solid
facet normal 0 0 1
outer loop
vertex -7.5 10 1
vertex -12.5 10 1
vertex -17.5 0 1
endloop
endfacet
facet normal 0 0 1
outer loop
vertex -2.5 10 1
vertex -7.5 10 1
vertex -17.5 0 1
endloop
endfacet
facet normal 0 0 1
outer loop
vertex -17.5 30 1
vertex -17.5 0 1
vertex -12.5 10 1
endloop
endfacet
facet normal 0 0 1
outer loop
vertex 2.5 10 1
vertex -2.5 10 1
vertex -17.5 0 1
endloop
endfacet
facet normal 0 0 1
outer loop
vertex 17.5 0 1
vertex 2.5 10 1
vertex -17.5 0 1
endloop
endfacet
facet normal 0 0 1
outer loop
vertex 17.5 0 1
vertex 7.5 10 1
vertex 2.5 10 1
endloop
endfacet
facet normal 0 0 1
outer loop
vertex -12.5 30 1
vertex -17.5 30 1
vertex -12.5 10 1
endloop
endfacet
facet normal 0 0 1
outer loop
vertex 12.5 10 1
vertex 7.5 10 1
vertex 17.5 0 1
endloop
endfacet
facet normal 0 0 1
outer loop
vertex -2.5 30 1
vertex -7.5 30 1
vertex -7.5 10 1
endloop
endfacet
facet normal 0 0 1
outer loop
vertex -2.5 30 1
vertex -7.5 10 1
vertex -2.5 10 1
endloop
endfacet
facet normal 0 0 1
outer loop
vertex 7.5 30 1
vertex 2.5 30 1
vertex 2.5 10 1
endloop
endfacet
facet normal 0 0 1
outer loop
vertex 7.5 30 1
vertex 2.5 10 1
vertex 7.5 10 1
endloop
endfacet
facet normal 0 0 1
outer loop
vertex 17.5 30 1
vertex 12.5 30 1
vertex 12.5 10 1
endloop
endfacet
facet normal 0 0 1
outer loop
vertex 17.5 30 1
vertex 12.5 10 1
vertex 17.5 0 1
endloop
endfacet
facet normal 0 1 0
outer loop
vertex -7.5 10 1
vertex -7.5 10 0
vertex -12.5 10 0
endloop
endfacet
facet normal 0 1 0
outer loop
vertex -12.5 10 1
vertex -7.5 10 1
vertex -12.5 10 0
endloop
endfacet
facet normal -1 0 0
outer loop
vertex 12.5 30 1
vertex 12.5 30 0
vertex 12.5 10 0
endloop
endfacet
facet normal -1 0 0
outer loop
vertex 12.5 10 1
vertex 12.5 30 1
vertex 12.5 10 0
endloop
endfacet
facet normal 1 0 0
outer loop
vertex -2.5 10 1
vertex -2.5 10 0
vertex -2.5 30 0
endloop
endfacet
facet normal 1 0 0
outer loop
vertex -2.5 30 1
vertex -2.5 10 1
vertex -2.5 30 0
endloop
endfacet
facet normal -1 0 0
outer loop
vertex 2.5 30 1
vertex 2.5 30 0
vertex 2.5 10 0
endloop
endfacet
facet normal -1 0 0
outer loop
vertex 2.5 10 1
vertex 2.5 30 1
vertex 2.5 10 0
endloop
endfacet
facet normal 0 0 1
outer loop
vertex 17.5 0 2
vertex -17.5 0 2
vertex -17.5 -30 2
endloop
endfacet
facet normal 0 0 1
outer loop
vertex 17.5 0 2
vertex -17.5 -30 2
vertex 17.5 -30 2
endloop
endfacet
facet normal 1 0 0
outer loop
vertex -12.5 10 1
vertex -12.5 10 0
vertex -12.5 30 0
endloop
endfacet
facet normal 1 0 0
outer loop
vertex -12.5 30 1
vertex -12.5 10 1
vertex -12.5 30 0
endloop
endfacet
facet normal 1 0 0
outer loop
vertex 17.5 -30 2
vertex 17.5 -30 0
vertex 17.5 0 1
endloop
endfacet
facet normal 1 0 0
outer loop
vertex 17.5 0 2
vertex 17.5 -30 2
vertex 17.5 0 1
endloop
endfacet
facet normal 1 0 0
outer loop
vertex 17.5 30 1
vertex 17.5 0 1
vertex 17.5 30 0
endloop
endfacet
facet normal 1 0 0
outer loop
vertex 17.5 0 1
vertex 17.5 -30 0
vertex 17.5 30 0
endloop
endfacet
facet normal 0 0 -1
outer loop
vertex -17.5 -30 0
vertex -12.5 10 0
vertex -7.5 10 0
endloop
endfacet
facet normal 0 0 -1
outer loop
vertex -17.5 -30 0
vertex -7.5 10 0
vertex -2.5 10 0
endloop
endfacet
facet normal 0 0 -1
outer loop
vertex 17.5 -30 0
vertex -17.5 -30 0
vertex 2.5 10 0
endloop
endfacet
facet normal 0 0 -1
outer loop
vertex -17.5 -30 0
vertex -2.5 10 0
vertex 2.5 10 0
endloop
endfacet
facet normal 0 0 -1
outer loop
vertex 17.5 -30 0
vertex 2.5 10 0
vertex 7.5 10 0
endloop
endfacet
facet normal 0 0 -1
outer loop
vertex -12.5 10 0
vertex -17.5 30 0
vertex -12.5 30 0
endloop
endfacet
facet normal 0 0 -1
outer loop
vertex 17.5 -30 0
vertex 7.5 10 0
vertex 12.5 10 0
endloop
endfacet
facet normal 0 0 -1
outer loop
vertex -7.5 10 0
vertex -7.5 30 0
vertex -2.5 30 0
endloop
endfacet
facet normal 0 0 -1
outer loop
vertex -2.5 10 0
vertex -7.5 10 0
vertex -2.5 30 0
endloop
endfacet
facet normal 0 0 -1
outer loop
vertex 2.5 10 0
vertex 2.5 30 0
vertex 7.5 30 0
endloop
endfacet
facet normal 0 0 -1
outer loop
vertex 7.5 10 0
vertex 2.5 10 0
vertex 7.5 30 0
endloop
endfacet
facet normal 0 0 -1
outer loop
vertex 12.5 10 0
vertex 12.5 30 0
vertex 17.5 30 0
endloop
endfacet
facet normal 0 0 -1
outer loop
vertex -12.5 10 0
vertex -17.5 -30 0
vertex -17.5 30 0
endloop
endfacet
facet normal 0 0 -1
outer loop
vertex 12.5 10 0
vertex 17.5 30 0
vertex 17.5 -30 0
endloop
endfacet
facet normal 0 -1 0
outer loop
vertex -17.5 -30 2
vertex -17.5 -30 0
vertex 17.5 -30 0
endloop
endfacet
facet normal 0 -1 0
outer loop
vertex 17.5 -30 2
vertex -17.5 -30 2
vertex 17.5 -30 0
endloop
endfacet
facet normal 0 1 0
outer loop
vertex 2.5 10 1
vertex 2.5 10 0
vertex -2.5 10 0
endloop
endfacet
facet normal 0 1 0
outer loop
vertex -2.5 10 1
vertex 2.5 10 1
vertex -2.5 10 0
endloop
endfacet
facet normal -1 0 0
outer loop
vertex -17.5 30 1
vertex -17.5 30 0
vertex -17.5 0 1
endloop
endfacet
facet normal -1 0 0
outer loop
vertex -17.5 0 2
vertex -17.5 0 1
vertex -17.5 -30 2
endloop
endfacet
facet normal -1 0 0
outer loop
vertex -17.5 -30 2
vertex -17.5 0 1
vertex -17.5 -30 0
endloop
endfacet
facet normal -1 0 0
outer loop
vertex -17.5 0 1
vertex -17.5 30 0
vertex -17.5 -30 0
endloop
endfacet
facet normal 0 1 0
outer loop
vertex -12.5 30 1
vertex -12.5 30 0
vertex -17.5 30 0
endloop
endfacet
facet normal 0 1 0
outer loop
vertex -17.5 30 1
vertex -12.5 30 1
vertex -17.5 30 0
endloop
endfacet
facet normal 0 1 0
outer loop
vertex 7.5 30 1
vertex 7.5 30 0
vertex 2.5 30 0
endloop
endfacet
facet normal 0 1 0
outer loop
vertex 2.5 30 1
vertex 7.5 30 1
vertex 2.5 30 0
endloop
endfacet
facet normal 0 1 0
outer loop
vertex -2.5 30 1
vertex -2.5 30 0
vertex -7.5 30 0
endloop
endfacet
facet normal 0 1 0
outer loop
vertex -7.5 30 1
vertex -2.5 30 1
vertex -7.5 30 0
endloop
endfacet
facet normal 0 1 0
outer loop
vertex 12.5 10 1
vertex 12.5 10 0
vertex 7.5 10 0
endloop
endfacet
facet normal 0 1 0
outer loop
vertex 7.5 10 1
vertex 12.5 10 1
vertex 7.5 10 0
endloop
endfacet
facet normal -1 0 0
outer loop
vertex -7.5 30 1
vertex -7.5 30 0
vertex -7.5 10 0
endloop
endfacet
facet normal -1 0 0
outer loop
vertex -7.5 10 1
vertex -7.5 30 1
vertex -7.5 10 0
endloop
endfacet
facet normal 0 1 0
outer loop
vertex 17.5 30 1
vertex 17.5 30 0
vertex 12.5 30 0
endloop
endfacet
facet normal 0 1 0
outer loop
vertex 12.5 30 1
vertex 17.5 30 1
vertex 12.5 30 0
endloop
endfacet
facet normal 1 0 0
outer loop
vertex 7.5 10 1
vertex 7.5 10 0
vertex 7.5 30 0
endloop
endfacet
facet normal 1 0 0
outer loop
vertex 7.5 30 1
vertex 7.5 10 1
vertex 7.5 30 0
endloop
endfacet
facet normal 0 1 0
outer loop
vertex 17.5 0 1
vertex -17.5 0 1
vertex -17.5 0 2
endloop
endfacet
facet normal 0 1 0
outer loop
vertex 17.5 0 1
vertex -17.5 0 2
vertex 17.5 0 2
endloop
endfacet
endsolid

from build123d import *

# Parameters (mm, degrees)
SKETCH1_W           = 35
SKETCH1_H           = 30
BOSS_EXTRUDE5_DEPTH = 2
BOSS_EXTRUDE6_DEPTH = 1


with BuildPart() as part:
    # Sketch1 → Boss-Extrude5 (new body)
    with BuildSketch(Plane.XY):
        with Locations((0, -15)):
            Rectangle(SKETCH1_W, SKETCH1_H)
    extrude(amount=BOSS_EXTRUDE5_DEPTH)

    # Sketch1<7> → Boss-Extrude6 (add)
    with BuildSketch(Plane.XY):
        Polygon((-12.5, 10), (-12.5, 30), (-17.5, 30), (-17.5, 10), (-17.5, 0), (17.5, 0), (17.5, 10), (17.5, 30), (12.5, 30), (12.5, 10), (7.5, 10), (7.5, 30), (2.5, 30), (2.5, 10), (-2.5, 10), (-2.5, 30), (-7.5, 30), (-7.5, 10), align=None)
    extrude(amount=BOSS_EXTRUDE6_DEPTH)


solid = part.part
